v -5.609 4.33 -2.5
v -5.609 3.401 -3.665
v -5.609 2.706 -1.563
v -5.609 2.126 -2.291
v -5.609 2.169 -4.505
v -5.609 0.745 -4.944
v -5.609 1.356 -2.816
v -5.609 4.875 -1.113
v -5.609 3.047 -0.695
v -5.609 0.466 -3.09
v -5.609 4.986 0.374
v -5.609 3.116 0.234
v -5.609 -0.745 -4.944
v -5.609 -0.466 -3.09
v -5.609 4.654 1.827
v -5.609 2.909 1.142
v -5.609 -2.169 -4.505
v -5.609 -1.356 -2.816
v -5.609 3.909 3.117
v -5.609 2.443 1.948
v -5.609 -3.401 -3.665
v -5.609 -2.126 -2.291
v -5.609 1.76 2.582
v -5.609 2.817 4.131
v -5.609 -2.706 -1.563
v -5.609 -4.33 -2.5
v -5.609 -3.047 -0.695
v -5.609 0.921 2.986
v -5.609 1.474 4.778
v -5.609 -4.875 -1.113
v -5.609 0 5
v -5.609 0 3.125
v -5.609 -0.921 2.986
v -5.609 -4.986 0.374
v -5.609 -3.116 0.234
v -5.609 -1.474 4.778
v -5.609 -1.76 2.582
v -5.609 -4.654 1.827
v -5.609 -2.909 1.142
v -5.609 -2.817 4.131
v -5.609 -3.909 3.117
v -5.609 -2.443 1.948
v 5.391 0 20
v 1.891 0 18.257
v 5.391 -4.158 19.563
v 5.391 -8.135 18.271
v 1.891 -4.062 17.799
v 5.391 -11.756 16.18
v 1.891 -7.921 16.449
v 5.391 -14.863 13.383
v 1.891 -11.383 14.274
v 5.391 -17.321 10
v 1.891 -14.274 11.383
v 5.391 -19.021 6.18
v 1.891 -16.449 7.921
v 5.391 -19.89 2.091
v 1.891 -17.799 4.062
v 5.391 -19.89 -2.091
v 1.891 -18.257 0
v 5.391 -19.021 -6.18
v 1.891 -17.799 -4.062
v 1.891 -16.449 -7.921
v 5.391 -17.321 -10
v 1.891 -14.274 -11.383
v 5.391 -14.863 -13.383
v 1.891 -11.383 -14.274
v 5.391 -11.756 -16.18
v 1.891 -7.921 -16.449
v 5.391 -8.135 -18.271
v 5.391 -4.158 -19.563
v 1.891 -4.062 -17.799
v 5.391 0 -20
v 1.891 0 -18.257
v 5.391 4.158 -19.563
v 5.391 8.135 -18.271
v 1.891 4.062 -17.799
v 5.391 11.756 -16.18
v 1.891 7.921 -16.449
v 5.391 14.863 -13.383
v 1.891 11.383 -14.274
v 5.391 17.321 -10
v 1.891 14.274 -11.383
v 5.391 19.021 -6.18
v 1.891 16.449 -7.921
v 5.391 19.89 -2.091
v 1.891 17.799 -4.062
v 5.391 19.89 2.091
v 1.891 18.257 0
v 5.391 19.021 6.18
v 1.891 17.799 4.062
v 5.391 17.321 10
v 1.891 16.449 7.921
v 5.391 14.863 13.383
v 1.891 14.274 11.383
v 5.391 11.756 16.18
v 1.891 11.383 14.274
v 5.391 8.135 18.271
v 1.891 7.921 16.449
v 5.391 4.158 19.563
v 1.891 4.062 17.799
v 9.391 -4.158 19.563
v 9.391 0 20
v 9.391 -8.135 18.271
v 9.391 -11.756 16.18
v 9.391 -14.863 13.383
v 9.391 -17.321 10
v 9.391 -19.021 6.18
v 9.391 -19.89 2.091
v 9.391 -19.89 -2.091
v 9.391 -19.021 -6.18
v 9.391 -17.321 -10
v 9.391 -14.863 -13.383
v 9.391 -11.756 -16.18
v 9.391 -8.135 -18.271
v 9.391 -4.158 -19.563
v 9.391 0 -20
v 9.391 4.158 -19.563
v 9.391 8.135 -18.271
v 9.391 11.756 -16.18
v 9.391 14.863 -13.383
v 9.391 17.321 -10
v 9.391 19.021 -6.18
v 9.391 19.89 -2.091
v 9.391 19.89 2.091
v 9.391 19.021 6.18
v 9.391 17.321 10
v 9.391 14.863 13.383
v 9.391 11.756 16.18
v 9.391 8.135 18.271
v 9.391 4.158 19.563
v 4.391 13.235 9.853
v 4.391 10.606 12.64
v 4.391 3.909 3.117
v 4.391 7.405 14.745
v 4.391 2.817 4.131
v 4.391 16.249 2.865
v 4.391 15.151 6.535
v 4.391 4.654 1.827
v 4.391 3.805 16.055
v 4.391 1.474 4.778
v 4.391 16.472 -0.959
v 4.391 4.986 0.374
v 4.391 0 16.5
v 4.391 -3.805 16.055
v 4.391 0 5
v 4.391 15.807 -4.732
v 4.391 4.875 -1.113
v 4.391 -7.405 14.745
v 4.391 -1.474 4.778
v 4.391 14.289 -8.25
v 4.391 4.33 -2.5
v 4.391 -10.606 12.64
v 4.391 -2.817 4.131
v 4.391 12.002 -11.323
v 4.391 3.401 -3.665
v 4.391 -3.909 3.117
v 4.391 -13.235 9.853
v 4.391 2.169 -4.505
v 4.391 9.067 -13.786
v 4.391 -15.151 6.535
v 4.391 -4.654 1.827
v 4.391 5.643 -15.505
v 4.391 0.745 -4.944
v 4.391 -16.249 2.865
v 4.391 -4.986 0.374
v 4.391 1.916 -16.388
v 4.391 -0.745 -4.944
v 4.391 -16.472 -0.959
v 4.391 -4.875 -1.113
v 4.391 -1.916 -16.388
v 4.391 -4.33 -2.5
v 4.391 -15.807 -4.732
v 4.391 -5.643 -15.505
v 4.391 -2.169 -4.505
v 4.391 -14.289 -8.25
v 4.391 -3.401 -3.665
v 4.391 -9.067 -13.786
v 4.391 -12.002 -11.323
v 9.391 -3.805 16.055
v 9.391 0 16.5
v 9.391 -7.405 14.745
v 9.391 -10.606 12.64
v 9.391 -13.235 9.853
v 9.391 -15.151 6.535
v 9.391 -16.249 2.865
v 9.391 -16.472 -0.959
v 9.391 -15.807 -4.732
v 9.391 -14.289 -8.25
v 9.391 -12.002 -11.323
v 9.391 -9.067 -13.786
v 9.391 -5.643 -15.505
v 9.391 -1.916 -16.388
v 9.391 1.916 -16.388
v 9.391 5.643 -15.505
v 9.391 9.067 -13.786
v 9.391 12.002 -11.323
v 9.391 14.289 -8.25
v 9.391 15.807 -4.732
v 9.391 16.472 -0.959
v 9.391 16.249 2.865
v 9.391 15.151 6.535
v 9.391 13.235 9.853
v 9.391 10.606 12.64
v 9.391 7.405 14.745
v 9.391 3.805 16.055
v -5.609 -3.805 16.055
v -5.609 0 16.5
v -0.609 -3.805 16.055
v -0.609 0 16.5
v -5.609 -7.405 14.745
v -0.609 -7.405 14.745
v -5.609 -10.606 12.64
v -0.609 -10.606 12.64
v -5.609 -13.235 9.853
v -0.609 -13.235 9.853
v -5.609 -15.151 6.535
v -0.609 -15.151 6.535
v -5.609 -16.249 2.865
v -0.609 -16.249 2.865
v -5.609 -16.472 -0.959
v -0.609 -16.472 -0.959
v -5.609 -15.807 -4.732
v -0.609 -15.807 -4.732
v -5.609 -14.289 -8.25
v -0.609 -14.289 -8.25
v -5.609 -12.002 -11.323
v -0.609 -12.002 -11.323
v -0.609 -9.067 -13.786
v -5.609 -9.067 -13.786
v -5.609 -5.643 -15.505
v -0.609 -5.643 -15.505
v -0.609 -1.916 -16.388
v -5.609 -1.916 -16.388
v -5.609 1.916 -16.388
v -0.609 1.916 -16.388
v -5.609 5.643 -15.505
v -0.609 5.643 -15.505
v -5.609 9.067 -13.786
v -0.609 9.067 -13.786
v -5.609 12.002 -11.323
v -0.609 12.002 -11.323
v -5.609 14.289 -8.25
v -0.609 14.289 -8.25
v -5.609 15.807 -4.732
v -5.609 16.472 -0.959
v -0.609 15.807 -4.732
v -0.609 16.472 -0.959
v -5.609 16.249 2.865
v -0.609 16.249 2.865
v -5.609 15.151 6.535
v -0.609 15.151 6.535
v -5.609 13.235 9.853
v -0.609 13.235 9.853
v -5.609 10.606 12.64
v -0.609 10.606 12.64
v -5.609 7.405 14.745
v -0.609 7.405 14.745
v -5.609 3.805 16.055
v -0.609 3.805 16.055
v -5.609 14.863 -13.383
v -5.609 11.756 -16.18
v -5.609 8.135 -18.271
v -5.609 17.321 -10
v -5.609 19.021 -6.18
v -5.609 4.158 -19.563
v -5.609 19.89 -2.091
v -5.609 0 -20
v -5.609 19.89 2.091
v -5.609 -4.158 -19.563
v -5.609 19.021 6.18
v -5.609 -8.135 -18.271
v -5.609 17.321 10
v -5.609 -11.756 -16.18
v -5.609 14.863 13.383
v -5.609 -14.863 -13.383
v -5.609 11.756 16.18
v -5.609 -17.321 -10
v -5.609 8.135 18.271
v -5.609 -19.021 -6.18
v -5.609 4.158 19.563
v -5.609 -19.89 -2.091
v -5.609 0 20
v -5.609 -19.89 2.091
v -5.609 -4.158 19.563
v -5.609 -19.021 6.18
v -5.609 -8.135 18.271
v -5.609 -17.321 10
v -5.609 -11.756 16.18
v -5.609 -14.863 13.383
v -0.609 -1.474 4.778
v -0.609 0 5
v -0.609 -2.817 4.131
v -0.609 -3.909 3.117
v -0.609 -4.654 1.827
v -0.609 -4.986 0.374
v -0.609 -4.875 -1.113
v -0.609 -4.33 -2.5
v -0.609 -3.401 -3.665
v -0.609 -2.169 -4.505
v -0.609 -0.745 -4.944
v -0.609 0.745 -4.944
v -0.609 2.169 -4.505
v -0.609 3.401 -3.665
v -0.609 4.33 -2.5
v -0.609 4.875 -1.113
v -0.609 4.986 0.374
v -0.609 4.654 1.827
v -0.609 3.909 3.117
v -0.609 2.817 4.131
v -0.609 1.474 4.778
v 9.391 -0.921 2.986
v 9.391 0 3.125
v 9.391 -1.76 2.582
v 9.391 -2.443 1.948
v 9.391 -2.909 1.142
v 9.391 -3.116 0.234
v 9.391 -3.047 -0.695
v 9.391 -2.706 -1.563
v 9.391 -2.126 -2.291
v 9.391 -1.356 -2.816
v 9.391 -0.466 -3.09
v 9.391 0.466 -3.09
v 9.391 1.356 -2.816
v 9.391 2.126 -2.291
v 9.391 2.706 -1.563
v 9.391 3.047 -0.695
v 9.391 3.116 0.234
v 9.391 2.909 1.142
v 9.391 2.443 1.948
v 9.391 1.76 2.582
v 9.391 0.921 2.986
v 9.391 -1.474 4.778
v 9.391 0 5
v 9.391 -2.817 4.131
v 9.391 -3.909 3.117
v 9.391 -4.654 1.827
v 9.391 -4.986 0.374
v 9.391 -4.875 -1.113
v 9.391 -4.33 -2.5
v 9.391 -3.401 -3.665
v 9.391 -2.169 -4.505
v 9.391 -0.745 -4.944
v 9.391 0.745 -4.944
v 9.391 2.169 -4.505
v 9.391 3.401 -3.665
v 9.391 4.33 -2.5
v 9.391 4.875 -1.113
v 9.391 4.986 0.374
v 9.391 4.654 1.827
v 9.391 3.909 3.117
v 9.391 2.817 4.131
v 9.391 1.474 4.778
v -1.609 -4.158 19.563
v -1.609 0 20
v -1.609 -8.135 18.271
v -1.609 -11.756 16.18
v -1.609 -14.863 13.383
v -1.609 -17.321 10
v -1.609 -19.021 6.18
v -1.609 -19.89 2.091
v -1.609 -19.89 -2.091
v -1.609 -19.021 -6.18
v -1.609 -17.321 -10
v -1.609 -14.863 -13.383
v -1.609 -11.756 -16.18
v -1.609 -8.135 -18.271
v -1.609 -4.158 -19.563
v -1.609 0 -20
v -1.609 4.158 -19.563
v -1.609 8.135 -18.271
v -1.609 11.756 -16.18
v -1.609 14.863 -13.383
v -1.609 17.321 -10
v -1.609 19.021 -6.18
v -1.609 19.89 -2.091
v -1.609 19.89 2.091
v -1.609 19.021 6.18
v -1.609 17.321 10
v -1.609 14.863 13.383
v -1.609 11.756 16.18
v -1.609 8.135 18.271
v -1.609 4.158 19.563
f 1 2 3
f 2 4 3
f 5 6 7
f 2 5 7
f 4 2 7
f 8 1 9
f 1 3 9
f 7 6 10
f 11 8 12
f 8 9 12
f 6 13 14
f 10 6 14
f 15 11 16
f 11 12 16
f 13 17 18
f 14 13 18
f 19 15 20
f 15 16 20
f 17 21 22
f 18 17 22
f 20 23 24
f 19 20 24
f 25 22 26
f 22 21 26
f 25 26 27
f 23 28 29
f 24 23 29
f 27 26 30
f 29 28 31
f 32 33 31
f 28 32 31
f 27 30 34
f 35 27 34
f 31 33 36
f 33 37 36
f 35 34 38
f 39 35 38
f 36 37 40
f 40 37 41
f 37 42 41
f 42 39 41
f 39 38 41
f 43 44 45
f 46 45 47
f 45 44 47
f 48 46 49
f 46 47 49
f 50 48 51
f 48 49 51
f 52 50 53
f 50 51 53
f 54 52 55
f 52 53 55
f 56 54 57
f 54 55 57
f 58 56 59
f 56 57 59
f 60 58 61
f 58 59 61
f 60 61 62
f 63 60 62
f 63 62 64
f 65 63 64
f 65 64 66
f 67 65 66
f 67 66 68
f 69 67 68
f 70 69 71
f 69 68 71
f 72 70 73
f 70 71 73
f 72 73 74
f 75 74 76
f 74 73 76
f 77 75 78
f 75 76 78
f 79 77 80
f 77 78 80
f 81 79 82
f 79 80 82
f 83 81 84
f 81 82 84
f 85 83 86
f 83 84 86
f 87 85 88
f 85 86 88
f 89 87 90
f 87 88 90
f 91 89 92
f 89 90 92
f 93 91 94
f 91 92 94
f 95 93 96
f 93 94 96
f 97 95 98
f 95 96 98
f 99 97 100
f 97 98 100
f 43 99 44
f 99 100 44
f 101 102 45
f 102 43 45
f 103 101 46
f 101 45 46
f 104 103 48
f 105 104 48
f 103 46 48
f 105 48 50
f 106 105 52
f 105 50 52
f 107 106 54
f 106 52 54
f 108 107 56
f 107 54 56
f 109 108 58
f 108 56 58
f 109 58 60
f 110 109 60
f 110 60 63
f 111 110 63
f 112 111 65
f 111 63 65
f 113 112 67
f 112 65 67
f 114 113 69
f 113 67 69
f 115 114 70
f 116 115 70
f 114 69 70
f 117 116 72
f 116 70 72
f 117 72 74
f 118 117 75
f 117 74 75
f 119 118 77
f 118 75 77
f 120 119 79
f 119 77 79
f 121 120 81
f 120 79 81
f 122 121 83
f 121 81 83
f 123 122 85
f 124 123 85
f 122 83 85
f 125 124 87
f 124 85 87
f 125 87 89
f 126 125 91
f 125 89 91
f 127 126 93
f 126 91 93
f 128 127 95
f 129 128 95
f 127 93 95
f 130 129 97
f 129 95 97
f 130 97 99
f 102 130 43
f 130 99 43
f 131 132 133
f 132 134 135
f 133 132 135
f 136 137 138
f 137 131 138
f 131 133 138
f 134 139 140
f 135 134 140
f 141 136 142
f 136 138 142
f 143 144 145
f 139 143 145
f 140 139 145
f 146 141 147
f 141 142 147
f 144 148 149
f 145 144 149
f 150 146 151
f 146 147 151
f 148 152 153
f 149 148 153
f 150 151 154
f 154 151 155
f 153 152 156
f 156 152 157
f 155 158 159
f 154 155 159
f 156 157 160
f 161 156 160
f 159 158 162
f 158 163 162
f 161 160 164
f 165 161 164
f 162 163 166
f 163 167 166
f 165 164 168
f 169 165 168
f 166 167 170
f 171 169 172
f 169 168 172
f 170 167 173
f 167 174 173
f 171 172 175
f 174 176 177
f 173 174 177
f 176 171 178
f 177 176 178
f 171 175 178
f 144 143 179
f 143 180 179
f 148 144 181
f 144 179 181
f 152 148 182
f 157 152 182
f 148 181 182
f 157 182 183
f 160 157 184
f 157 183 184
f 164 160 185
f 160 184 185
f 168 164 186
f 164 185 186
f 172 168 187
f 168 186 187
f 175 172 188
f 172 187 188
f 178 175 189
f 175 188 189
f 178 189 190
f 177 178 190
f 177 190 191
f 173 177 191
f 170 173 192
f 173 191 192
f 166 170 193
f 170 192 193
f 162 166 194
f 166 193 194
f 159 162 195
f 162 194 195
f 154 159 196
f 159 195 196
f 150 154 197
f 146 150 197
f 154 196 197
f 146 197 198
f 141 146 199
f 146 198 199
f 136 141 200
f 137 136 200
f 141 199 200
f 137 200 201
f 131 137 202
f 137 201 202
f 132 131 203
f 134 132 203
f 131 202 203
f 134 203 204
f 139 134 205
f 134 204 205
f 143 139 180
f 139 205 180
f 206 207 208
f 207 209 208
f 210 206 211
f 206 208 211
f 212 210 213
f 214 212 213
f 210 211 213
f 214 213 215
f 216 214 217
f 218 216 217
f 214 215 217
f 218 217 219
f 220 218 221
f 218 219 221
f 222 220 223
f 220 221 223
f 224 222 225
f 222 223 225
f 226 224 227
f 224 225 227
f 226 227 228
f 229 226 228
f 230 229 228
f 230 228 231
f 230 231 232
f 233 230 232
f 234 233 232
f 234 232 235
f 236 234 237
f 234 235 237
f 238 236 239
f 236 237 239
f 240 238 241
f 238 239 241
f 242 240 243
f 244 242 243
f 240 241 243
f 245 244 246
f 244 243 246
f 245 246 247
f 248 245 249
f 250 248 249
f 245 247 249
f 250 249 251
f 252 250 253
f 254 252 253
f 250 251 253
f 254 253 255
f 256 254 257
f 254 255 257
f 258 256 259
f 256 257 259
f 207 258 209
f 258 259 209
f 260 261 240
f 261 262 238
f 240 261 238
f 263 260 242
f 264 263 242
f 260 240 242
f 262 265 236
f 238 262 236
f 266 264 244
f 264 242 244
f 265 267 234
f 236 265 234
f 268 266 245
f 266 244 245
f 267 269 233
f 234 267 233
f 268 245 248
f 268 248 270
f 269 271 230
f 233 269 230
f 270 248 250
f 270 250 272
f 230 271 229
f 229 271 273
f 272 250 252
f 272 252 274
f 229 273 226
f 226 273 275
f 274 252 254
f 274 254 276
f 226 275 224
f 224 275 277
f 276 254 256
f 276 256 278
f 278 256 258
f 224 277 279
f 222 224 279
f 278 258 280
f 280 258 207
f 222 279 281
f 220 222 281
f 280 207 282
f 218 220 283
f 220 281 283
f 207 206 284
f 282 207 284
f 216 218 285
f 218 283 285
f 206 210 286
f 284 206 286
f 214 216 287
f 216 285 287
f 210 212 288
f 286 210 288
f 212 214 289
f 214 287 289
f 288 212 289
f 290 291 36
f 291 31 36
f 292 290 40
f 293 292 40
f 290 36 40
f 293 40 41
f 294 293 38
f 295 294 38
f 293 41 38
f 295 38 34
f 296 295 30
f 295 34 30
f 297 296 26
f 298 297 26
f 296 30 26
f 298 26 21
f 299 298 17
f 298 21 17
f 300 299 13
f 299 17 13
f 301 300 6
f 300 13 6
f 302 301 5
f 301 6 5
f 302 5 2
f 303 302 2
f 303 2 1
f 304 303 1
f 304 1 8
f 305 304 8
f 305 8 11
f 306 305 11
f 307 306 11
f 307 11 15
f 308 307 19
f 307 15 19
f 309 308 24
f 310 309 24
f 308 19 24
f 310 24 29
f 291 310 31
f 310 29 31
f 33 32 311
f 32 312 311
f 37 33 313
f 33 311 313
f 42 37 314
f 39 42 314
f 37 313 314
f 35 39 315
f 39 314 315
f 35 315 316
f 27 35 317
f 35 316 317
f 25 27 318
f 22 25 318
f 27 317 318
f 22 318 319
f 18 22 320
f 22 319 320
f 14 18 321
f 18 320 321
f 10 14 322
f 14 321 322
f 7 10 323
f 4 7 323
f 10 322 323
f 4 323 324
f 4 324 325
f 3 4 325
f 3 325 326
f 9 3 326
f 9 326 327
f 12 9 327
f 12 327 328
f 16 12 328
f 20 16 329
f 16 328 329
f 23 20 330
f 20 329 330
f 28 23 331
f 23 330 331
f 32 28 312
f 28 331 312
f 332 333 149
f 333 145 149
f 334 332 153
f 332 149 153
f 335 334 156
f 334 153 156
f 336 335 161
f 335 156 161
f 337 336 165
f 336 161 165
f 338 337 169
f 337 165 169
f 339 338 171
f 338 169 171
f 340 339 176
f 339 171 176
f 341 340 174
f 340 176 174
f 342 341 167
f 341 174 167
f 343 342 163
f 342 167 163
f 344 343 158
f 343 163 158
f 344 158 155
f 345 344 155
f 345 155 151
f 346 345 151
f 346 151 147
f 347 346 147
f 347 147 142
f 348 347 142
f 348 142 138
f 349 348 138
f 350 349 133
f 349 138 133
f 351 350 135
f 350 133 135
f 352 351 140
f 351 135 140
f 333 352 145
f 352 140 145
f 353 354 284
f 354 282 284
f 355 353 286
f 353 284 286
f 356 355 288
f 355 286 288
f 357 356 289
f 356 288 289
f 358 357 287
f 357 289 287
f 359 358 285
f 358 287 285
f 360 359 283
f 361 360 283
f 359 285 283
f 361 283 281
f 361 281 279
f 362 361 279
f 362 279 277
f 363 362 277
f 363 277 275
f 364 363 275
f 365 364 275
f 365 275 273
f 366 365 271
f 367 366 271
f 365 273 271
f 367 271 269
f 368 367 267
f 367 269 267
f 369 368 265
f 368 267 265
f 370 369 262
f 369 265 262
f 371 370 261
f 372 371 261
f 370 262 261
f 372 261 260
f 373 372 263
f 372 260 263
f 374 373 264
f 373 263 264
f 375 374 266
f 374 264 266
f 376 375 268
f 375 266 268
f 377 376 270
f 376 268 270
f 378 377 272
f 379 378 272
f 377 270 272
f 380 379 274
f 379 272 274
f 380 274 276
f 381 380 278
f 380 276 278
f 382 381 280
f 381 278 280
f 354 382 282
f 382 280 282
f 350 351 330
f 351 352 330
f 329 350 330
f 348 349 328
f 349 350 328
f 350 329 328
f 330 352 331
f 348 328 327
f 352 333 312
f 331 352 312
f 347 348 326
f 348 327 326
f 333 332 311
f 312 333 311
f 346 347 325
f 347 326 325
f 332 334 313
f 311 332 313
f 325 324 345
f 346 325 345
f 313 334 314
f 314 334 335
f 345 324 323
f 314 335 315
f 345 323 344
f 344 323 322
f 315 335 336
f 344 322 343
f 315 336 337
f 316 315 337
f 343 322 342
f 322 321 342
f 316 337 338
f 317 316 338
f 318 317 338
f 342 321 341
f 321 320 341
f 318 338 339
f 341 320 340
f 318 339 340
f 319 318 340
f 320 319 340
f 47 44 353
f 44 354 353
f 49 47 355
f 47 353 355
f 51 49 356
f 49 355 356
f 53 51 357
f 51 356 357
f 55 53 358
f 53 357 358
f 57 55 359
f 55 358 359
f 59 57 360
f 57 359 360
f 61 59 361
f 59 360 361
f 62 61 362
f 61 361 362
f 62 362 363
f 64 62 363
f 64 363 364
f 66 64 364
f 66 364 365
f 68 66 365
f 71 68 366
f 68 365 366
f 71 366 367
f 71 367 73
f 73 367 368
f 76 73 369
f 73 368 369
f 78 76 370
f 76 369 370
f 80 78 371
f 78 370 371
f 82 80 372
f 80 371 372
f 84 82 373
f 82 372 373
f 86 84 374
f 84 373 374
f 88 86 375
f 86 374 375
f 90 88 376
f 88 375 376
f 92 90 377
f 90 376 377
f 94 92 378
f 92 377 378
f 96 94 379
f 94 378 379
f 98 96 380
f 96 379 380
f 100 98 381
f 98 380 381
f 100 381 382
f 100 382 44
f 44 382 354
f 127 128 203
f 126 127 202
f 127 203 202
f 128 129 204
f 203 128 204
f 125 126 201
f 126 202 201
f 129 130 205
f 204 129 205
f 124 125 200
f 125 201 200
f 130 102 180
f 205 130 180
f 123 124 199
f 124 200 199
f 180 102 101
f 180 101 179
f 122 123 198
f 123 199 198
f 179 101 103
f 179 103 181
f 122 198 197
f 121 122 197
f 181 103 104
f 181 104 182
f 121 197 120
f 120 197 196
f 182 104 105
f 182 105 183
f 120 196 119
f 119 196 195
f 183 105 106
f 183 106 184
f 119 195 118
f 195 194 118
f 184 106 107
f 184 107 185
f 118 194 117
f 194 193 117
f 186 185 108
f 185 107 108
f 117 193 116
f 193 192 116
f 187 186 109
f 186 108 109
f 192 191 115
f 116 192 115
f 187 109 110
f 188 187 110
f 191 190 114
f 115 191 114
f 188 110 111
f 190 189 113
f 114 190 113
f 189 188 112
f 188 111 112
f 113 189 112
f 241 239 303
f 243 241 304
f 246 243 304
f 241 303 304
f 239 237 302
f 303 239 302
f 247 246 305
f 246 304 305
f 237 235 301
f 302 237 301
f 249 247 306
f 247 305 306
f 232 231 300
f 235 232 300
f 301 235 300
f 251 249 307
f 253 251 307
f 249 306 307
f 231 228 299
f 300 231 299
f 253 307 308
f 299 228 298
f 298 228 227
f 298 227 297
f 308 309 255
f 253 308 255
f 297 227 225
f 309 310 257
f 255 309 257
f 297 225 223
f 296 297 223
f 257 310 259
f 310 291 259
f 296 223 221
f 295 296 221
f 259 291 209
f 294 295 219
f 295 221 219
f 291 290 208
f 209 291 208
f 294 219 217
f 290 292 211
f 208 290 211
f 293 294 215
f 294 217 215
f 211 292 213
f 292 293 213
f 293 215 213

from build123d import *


with BuildPart() as part:
    # Çizim1 → Döndür1 (revolve)
    with BuildSketch(Plane.XY, mode=Mode.PRIVATE) as d_nd_r1_sk:
        Polygon((-5.608586602, 3.125), (9.391413398, 3.125), (9.391413398, 5), (4.391413398, 5), (4.391413398, 16.5), (9.391413398, 16.5), (9.391413398, 20), (5.391413398, 20), (1.891413398, 18.256578947), (-1.608586602, 20), (-5.608586602, 20), (-5.608586602, 16.5), (-0.608586602, 16.5), (-0.608586602, 5), (-5.608586602, 5), align=None)
    revolve(d_nd_r1_sk.sketch.rotate(Axis((-7.63862782, 0, 0), (1, 0, 0)), 90), axis=Axis((-7.63862782, 0, 0), (1, 0, 0)))


solid = part.part
